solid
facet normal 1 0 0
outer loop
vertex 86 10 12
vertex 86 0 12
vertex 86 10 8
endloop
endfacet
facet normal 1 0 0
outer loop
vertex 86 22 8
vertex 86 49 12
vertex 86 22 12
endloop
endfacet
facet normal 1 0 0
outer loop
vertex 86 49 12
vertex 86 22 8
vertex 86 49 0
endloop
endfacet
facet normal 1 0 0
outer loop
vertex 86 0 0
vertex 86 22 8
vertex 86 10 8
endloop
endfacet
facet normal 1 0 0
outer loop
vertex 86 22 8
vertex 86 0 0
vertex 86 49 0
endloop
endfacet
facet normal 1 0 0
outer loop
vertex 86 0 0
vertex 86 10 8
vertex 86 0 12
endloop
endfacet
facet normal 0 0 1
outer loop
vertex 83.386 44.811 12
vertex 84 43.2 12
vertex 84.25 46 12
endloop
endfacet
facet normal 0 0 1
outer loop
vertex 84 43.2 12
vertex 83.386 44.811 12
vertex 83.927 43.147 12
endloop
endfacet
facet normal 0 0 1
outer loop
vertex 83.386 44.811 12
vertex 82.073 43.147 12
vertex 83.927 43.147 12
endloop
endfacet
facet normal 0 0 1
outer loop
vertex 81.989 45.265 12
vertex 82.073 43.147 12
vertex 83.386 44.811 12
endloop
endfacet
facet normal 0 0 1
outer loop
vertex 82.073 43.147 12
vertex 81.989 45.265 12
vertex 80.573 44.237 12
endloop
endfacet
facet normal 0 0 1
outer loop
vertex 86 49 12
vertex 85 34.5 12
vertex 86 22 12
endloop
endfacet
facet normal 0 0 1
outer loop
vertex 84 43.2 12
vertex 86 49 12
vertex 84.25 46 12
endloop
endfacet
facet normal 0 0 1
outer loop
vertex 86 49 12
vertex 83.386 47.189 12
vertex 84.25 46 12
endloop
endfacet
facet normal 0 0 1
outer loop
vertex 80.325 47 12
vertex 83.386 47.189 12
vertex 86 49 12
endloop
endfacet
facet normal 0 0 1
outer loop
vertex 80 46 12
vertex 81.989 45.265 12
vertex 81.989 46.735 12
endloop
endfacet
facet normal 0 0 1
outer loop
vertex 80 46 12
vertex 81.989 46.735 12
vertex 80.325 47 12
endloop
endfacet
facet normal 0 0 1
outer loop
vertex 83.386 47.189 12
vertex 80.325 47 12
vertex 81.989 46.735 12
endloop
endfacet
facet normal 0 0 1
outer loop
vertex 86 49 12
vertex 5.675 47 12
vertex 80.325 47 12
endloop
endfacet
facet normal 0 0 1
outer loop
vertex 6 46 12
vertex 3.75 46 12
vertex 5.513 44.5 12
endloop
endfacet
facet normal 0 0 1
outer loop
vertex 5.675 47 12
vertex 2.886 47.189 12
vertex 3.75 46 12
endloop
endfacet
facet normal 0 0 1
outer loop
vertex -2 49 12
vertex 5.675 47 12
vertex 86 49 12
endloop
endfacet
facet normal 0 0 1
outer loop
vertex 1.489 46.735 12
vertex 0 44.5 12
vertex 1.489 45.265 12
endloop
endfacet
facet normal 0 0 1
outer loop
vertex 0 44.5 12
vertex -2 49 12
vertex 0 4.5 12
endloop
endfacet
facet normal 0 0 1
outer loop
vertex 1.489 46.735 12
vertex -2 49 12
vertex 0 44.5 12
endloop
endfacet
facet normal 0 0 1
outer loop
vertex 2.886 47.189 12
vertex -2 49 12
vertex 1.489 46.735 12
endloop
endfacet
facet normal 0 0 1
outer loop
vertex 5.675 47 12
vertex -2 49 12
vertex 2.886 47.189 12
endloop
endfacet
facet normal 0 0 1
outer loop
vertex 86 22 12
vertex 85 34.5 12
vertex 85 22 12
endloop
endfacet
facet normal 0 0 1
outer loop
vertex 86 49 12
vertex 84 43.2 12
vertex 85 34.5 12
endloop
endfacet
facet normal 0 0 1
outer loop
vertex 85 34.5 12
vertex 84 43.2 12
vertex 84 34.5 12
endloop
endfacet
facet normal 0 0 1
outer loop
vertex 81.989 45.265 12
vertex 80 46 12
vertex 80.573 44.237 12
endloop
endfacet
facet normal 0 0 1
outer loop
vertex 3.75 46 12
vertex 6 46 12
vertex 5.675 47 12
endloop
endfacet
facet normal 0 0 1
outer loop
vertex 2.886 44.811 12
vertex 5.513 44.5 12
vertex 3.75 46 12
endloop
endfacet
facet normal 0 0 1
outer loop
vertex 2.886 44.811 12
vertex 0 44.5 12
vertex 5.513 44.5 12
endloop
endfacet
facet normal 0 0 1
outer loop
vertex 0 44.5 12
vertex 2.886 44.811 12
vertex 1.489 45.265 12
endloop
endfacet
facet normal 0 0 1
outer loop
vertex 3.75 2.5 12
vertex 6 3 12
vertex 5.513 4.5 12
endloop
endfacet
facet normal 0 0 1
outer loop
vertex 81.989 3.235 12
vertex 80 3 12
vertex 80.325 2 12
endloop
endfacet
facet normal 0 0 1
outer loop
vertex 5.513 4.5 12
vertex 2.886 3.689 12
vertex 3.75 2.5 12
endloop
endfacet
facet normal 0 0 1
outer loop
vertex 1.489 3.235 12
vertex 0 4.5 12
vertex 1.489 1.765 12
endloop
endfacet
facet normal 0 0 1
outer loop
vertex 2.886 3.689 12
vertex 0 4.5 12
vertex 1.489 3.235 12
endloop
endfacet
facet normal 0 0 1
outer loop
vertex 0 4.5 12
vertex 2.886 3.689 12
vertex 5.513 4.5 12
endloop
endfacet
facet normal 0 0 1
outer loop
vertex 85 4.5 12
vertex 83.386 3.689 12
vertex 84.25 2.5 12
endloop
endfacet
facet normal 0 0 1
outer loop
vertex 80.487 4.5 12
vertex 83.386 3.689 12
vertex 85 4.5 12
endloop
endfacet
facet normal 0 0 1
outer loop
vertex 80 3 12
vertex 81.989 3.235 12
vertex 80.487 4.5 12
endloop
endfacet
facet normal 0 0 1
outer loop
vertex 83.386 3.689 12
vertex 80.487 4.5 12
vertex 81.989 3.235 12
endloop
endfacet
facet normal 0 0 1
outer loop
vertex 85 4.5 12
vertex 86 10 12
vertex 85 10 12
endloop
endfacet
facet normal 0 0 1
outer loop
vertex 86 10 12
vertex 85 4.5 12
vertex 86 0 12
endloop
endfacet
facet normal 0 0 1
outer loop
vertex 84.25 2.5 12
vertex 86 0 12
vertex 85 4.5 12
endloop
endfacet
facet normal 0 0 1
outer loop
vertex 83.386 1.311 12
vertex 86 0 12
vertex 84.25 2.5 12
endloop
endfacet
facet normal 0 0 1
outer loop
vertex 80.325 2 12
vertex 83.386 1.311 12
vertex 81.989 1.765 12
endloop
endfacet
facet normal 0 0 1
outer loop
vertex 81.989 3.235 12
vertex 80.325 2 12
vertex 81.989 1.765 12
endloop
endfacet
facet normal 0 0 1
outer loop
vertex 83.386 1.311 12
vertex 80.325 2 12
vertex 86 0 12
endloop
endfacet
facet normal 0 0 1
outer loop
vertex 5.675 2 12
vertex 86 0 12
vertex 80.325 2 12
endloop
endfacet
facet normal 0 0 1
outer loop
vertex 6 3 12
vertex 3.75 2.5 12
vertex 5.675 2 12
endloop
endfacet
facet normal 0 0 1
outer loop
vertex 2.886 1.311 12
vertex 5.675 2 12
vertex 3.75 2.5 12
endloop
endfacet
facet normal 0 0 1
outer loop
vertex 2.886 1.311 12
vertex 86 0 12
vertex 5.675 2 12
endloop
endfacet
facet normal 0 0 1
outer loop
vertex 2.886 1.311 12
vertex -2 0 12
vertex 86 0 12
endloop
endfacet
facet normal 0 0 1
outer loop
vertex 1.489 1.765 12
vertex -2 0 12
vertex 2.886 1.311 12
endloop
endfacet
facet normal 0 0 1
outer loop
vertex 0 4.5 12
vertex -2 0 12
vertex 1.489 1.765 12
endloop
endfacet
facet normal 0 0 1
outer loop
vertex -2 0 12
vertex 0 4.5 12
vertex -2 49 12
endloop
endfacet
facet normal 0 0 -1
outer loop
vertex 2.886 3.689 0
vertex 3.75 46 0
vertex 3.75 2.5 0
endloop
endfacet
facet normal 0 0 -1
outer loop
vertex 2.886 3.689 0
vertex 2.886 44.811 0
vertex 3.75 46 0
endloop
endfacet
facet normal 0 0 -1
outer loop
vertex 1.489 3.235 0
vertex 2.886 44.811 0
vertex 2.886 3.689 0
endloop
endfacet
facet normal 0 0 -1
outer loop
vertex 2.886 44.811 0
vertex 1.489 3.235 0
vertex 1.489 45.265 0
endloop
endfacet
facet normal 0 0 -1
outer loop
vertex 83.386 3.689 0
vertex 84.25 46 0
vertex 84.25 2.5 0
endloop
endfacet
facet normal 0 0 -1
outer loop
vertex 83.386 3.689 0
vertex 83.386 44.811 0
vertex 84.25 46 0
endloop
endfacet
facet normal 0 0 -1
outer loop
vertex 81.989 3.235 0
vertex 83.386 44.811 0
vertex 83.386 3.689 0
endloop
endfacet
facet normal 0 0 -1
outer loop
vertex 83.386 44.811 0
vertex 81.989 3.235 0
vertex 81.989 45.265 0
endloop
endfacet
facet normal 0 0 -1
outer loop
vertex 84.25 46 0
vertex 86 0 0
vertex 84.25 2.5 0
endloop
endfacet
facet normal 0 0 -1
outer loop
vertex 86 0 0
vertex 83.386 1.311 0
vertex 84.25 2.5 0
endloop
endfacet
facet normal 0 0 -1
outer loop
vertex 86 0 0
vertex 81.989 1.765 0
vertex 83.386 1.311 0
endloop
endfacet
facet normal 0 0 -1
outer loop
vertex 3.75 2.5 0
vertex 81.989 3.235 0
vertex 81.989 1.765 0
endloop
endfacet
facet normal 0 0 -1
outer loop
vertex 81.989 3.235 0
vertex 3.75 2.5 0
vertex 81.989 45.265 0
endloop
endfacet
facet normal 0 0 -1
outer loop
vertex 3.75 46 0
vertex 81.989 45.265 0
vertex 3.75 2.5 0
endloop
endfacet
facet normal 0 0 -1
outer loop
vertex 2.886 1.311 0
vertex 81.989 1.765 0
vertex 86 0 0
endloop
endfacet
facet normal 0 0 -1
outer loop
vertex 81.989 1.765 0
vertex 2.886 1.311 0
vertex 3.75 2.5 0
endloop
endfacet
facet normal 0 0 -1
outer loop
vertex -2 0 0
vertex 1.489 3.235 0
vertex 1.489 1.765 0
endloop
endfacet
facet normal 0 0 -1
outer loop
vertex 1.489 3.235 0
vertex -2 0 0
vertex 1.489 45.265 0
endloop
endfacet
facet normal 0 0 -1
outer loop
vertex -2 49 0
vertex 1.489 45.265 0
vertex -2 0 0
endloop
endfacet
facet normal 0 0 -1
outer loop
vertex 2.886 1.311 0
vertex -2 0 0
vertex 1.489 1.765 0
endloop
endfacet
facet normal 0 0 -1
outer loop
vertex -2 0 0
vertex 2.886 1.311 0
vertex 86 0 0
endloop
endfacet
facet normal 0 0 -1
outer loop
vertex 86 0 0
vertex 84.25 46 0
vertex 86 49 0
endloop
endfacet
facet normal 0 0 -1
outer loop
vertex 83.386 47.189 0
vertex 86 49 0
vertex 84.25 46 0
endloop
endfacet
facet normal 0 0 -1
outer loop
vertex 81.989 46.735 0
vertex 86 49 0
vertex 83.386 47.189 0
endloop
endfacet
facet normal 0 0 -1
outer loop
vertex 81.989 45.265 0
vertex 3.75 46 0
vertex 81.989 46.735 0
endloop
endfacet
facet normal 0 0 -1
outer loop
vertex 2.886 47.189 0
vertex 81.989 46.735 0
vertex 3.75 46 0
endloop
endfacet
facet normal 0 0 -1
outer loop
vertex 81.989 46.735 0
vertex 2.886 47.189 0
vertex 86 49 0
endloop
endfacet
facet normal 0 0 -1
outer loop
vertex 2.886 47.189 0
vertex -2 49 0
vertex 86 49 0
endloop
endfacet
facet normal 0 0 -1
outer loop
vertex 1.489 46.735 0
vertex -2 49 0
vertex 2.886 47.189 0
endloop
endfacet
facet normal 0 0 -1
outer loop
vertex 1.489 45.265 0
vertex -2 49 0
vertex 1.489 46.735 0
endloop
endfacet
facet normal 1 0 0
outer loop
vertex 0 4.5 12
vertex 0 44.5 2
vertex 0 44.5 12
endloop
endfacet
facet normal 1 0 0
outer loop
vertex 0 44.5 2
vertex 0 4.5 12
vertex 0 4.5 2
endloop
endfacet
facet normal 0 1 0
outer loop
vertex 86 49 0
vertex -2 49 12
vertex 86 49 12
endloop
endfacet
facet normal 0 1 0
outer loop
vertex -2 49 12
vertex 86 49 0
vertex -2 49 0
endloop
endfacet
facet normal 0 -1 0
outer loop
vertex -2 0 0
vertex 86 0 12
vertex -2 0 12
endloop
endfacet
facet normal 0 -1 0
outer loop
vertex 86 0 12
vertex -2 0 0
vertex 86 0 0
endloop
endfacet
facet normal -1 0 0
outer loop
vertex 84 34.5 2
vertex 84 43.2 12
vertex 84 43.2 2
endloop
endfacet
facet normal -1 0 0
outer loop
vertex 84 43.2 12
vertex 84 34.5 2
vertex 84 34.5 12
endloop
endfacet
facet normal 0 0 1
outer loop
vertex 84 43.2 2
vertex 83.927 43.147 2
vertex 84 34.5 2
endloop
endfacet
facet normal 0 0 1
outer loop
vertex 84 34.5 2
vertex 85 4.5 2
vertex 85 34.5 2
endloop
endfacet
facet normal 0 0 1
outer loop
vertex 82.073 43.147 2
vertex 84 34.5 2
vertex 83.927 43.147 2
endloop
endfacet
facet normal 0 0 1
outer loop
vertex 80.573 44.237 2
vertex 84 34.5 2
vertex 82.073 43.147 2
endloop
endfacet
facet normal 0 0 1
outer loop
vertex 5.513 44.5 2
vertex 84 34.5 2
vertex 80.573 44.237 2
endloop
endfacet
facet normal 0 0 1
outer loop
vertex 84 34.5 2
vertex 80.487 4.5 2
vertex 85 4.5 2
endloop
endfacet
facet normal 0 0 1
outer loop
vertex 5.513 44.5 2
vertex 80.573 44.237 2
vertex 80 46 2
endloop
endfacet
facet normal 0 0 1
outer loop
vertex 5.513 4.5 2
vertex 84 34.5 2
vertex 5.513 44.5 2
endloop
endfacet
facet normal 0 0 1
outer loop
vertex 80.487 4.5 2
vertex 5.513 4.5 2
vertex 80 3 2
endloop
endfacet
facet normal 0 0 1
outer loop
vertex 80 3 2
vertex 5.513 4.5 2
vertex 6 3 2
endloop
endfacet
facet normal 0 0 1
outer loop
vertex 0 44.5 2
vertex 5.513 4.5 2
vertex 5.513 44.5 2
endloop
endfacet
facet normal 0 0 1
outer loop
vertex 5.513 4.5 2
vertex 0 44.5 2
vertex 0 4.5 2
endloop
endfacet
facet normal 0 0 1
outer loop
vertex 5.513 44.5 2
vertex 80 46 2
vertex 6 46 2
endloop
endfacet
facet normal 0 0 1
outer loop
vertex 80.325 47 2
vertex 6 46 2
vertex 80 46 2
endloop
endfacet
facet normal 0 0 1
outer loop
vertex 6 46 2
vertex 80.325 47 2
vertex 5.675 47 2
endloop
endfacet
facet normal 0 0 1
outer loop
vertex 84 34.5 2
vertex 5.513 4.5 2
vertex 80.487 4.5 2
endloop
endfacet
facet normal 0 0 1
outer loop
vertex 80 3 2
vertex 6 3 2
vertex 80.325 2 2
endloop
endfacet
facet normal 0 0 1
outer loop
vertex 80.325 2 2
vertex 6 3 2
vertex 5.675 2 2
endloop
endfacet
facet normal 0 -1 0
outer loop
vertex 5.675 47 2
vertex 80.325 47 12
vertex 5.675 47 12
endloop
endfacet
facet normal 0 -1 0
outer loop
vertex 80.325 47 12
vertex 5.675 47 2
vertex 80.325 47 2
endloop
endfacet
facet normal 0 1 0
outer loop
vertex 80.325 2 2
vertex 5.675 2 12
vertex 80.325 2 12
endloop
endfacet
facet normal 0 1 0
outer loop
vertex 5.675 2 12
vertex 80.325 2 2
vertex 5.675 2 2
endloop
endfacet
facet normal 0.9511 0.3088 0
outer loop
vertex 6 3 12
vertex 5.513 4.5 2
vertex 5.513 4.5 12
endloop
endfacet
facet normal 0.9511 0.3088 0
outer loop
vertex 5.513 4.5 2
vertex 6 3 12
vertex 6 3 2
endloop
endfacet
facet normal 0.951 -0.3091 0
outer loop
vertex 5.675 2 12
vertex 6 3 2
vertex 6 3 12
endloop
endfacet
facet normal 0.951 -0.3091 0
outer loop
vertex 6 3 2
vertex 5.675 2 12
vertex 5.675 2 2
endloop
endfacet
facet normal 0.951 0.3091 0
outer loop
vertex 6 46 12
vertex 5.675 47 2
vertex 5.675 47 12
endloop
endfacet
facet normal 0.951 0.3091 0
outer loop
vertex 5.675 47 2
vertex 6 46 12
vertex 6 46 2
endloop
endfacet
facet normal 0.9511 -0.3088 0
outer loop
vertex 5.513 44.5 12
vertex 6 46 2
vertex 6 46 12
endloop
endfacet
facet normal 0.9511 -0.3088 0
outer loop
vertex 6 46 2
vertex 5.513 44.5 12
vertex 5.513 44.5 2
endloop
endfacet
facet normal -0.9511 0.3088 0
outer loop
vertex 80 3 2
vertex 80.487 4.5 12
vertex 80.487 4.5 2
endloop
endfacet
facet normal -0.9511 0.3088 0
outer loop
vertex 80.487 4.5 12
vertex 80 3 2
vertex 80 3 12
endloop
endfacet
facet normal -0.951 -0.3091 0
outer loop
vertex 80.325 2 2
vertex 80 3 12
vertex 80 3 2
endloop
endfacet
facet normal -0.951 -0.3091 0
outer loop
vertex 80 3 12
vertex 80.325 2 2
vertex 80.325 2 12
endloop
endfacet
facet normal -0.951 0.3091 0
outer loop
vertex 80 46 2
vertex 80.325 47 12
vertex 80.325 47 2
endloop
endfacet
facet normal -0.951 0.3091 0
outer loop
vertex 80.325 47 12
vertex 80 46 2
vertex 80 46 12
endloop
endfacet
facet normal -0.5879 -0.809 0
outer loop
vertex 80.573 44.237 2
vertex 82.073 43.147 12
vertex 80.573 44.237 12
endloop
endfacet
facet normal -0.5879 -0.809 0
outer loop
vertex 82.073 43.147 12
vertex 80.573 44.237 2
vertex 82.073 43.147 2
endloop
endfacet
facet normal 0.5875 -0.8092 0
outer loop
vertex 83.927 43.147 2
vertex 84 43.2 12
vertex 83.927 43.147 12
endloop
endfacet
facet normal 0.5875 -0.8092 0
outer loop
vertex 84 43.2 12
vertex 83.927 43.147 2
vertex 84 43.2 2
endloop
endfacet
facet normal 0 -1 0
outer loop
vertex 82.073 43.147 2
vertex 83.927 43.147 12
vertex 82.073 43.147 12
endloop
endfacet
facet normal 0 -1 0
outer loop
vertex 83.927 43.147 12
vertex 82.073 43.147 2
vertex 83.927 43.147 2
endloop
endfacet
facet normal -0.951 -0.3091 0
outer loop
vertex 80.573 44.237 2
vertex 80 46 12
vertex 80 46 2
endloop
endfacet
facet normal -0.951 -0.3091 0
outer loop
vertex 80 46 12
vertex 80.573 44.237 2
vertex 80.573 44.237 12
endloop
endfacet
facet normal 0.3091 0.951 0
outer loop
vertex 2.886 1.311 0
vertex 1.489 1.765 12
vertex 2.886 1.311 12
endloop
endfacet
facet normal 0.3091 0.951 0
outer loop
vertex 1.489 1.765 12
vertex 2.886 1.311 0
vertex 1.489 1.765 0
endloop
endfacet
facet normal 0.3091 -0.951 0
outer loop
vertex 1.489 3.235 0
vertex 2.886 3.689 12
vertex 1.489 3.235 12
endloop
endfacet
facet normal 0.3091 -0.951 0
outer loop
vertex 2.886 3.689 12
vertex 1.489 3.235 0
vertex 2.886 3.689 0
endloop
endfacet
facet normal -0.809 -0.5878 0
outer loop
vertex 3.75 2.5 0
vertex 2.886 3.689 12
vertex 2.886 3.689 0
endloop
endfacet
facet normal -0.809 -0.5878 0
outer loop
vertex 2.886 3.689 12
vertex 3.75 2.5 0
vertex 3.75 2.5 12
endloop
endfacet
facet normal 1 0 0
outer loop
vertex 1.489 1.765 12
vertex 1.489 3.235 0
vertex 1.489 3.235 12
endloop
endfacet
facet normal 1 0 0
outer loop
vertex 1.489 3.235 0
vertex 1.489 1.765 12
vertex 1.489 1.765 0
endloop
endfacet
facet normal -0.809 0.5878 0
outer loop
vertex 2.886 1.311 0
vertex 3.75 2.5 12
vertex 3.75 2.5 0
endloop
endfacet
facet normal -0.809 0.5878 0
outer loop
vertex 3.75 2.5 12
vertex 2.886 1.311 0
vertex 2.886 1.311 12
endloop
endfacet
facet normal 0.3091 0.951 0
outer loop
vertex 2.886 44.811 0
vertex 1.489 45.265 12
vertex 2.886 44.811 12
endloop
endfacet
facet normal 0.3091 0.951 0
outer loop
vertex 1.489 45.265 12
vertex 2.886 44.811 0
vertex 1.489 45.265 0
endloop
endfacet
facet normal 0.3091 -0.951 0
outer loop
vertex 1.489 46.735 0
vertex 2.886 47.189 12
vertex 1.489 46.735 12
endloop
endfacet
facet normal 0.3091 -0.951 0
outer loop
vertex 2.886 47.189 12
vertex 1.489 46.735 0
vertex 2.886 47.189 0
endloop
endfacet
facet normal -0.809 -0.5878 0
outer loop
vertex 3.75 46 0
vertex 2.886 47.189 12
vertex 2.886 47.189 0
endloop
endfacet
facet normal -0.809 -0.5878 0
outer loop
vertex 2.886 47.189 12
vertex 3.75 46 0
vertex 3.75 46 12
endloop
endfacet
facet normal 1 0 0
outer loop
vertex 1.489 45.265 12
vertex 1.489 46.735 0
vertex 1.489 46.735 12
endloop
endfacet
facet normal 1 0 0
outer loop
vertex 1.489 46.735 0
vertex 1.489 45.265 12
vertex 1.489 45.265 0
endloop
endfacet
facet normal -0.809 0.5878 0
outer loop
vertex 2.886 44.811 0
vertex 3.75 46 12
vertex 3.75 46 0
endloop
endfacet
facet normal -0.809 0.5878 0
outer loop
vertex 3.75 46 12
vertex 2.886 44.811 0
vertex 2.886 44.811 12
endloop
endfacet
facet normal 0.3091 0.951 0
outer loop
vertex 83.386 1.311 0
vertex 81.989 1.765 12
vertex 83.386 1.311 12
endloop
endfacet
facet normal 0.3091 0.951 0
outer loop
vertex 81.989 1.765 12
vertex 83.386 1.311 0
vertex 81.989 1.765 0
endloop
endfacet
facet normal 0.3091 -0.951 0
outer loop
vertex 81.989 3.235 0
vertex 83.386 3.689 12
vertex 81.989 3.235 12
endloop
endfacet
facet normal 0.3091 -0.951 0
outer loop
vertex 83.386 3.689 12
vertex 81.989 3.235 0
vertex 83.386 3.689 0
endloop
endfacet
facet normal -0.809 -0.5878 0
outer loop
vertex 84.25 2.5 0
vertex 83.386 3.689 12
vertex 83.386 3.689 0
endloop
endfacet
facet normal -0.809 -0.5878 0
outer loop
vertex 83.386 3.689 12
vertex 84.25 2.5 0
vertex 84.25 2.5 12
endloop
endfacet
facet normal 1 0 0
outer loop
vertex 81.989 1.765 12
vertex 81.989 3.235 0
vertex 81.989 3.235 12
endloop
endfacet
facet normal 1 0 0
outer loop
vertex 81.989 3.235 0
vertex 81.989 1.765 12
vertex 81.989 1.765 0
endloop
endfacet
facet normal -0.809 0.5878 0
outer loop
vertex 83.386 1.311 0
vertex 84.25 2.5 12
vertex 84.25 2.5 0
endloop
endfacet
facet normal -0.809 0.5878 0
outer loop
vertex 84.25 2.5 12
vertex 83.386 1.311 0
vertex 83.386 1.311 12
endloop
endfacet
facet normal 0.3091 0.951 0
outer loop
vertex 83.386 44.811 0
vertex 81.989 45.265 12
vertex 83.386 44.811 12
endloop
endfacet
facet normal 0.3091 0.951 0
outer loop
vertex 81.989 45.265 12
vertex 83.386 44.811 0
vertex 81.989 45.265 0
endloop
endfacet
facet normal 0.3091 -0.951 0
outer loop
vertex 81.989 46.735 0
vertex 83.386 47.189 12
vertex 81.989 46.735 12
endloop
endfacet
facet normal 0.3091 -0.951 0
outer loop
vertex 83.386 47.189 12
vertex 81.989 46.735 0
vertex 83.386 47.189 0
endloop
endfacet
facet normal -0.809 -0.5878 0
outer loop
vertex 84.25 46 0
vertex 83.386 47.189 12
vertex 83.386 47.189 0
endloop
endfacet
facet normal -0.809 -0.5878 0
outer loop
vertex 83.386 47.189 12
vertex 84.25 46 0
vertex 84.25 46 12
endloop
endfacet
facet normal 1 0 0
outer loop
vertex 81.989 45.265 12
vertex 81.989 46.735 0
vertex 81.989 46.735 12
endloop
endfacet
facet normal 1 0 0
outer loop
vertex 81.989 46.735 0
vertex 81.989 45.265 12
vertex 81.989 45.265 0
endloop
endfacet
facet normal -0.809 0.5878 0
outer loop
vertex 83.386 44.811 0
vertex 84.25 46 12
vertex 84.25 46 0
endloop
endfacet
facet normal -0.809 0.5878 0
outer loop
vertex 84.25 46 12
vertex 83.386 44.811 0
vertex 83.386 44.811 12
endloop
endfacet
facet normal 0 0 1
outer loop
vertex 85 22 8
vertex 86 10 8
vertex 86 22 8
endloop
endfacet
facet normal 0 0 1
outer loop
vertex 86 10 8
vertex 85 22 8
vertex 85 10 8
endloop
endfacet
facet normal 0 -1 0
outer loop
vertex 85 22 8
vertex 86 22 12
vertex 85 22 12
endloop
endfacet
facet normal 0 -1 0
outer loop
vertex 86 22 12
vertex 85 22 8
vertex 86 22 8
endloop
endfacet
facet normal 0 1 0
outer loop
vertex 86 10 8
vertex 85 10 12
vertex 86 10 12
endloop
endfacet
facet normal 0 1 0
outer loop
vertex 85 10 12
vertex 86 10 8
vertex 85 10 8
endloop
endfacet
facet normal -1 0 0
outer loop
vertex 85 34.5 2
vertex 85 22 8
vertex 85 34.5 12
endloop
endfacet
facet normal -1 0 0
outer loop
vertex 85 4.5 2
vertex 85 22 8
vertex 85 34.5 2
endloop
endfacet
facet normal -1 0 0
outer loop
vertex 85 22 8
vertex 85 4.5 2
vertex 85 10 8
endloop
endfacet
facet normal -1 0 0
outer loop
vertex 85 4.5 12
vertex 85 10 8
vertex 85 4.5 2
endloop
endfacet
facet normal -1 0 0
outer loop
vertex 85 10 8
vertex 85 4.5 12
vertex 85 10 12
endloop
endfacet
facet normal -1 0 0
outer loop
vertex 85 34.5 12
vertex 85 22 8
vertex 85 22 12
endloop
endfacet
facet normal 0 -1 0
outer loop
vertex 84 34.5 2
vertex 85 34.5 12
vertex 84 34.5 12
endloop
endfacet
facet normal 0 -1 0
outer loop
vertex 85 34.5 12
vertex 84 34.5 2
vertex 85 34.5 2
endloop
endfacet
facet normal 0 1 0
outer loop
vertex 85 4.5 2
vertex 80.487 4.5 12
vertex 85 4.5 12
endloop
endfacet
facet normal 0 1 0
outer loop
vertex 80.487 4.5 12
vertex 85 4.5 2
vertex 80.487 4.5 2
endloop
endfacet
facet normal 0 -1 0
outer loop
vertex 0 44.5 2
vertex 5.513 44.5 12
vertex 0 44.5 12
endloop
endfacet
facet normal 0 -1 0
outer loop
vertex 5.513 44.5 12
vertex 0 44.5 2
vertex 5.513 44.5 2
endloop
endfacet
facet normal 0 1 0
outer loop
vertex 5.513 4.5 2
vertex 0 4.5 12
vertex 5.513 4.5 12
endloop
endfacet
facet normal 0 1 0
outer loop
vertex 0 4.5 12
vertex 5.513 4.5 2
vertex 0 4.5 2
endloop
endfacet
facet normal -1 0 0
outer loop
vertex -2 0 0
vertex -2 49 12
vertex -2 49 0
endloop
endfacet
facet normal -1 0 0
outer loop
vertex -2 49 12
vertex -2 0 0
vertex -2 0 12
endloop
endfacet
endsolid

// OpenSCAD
difference(){
union(){
difference(){
cube([86,49,12]);
translate([2,2,2]) cube([82,45,12]);
}
//add cylinders for screwholes
translate([3,3,0])cylinder(d=6,h=12);
translate([3,46,0])cylinder(d=6,h=12);
translate([83,3,0])cylinder(d=6,h=12);
translate([83,46,0])cylinder(d=6,h=12);
}

//add screwholes
translate([2.5,2.5,0])cylinder(d=2.5,h=12);
translate([2.5,46,0])cylinder(d=2.5,h=12);
translate([83,2.5,0])cylinder(d=2.5,h=12);
translate([83,46,0])cylinder(d=2.5,h=12);

//add usb port
translate([83,10,8])cube([10,12,4]);

//thin wall for RPI2040w
translate([80,4.5,2])cube([5,30,14]);

//thin wall for stuff on the left
translate([0,4.5,2])cube([7,40,14]);


}

//add a side panel to cover the left side
translate([-2,0,0])cube([2,49,12]);
